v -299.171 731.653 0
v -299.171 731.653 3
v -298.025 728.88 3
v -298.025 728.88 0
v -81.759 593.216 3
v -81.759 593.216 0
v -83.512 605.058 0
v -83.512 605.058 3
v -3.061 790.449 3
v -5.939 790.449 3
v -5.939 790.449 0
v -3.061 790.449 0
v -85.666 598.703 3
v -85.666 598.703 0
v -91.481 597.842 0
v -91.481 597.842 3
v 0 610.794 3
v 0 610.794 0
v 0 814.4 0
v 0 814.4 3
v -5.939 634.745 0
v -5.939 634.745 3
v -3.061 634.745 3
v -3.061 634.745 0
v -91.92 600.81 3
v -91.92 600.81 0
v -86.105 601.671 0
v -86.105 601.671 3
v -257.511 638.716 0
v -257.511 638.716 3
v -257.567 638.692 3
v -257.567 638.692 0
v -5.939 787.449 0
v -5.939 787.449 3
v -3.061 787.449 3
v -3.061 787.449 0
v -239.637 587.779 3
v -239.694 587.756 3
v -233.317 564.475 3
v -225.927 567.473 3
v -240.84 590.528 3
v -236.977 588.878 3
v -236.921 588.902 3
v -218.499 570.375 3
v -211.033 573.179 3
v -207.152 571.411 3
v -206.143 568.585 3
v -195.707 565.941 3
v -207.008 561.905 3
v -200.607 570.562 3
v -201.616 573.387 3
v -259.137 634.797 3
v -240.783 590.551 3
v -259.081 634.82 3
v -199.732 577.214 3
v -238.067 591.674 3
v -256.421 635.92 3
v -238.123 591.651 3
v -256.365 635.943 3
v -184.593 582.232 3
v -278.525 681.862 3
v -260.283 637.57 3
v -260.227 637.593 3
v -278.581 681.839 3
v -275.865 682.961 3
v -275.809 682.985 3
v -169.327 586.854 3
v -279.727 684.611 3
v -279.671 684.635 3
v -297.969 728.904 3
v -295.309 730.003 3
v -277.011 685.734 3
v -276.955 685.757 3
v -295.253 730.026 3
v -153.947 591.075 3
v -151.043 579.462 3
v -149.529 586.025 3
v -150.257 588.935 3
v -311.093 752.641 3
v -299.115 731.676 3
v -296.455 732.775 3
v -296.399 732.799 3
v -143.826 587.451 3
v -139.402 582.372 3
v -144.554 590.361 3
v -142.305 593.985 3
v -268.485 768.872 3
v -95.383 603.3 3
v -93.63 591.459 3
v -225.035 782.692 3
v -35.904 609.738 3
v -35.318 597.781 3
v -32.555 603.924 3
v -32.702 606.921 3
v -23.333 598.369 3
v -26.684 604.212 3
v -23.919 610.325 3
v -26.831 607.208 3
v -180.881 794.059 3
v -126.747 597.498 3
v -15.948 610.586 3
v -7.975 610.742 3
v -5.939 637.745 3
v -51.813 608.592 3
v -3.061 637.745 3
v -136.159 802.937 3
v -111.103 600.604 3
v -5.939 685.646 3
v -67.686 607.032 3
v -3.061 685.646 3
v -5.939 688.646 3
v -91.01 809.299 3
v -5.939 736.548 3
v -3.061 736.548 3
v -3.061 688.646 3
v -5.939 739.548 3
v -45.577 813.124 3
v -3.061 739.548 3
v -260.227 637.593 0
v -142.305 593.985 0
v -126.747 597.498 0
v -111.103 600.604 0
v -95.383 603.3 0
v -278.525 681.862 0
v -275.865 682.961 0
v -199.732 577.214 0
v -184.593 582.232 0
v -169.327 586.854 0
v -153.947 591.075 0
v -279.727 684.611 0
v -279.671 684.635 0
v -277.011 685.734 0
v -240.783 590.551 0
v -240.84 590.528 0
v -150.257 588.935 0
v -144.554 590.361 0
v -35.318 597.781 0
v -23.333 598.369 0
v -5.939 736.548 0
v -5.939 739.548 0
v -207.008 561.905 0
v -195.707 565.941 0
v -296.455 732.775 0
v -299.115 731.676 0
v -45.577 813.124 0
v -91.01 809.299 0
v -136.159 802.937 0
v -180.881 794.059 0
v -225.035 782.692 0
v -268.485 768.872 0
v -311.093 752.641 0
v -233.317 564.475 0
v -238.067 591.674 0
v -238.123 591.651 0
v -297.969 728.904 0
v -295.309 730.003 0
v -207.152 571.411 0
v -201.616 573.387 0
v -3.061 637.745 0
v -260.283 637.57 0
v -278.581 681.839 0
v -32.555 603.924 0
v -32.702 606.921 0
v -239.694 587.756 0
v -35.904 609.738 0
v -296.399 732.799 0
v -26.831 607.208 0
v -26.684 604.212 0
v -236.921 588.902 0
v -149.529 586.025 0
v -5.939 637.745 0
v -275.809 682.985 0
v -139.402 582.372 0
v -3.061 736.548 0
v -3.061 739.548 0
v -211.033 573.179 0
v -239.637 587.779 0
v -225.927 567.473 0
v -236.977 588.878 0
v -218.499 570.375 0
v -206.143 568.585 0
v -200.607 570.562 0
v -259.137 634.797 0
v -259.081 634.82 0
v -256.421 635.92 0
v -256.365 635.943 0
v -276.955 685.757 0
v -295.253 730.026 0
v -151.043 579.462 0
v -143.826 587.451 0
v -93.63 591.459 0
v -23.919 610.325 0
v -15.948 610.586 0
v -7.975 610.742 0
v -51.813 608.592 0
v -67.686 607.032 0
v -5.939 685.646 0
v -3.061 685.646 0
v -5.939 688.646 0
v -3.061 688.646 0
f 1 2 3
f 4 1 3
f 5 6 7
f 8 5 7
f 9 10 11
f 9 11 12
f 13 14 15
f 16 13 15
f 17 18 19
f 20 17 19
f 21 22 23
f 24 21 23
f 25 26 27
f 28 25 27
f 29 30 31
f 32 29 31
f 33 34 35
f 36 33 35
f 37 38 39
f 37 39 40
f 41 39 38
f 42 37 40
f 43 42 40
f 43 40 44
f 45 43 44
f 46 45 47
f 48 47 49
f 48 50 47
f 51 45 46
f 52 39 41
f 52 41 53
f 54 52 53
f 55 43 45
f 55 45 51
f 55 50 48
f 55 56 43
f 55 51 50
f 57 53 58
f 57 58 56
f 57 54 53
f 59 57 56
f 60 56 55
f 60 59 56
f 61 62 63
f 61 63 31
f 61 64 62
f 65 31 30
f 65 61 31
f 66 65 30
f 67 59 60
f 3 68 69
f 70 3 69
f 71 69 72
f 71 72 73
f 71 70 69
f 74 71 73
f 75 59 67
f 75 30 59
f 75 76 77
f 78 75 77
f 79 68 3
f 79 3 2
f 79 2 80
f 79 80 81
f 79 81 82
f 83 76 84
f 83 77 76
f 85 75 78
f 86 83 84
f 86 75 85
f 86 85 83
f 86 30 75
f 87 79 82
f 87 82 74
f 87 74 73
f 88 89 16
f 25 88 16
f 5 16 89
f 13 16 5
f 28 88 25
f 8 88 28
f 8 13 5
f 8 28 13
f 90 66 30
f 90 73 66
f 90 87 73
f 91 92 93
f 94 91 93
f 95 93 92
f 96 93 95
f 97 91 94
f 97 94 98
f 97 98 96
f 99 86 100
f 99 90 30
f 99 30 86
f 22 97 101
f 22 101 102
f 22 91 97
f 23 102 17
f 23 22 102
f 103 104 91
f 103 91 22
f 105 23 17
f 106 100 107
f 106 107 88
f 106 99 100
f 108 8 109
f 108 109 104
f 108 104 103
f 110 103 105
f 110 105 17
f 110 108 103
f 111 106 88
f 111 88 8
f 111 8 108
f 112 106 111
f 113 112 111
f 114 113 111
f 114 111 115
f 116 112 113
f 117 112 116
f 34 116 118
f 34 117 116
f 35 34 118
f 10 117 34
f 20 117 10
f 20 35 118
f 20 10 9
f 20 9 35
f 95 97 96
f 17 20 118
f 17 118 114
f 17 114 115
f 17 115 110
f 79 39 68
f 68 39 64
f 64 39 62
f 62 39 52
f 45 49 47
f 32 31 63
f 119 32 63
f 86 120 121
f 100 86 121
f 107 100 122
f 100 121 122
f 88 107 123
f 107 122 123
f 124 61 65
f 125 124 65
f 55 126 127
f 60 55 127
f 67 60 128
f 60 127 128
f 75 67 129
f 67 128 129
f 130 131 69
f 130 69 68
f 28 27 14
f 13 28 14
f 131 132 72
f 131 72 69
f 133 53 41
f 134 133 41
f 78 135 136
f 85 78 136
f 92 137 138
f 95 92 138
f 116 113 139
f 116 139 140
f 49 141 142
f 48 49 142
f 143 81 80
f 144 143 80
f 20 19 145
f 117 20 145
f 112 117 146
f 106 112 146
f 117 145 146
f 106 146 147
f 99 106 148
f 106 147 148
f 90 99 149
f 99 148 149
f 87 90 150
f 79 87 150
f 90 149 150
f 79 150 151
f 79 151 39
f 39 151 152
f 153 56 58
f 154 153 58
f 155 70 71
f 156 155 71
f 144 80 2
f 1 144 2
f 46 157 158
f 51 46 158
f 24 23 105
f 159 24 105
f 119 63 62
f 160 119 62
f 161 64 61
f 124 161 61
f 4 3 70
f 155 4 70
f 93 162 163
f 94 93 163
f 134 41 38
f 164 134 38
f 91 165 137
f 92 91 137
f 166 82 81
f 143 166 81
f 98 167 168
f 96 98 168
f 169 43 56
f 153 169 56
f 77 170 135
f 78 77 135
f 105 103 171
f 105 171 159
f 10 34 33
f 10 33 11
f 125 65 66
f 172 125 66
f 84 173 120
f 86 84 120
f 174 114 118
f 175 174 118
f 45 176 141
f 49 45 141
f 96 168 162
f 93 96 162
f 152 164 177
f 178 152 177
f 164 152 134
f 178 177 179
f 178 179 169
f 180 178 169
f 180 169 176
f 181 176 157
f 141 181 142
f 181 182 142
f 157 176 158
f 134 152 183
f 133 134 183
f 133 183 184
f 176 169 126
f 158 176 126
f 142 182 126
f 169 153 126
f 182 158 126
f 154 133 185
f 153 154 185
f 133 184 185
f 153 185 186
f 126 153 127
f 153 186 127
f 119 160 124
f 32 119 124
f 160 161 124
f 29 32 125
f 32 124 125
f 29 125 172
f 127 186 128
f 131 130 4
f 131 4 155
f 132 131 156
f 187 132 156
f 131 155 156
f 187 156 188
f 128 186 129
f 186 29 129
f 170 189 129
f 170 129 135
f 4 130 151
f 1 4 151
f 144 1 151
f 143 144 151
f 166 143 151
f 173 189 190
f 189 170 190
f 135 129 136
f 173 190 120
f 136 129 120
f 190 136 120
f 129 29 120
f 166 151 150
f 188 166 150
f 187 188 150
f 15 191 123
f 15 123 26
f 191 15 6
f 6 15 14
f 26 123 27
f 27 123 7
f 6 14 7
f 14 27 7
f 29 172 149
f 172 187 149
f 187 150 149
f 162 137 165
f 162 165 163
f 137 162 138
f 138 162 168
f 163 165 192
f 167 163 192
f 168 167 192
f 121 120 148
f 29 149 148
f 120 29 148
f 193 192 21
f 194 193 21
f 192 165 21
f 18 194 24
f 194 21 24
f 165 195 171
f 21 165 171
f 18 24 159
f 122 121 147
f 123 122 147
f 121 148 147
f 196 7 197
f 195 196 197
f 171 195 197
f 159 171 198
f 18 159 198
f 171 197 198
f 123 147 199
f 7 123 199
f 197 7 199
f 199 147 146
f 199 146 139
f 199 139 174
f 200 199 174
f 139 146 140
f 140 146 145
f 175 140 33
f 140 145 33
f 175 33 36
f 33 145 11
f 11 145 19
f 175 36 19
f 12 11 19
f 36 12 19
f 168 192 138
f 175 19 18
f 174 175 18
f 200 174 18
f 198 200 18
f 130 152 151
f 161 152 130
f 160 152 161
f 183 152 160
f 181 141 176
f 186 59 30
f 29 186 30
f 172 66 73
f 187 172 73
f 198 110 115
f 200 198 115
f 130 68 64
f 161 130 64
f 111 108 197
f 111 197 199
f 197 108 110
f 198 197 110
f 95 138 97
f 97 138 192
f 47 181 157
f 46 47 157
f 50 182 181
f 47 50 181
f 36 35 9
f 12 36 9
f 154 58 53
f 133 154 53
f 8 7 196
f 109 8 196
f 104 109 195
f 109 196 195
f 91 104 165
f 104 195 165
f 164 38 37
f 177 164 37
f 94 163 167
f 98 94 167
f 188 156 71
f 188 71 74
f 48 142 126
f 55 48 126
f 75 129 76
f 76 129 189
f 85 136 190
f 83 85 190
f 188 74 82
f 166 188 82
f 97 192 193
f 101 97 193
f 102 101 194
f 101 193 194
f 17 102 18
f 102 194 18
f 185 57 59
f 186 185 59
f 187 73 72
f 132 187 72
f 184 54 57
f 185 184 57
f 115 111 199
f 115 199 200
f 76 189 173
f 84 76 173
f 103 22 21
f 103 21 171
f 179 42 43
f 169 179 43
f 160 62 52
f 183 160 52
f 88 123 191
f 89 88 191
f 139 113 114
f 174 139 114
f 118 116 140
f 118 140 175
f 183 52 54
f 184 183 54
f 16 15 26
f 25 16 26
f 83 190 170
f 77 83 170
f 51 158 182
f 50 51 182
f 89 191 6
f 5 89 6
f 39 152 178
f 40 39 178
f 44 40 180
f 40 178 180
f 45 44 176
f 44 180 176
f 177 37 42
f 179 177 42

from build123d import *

# Parameters (mm, degrees)
F1_DEPTH = 3
F2_W     = 2.87808
F2_H     = 3
F2_W_2   = 0.06096
F3_DEPTH = 3.001


with BuildPart() as f1:
    # F0 (on Top) → F1 (new body)
    with BuildSketch(Plane.XY):
        with BuildLine():
            Line((0, 610.7938), (0, 814.4002))
            ThreePointArc((0, 814.4002), (-158.581862972, 798.8112909169), (-311.092710136, 752.6413564642))
            Line((-311.092710136, 752.6413564642), (-233.3171069657, 564.4751488911))
            ThreePointArc((-233.3171069657, 564.4751488911), (-222.21778397, 568.9361322731), (-211.0332265418, 573.1788930289))
            Line((-211.0332265418, 573.1788930289), (-211.0431366506, 573.2066473717))
            Line((-211.0431366506, 573.2066473717), (-205.3925469131, 575.2242760793))
            Line((-205.3925469131, 575.2242760793), (-199.7419556033, 577.2419053483))
            Line((-199.7419556033, 577.2419053483), (-199.7320454946, 577.2141510055))
            ThreePointArc((-199.7320454946, 577.2141510055), (-176.9750657056, 584.592928658), (-153.9465878827, 591.0748803643))
            Line((-153.9465878827, 591.0748803643), (-153.9537352346, 591.1034710825))
            Line((-153.9537352346, 591.1034710825), (-148.1328657869, 592.5586217348))
            Line((-148.1328657869, 592.5586217348), (-142.3119938407, 594.0137730116))
            Line((-142.3119938407, 594.0137730116), (-142.3048464889, 593.9851822935))
            ThreePointArc((-142.3048464889, 593.9851822935), (-118.9351607425, 599.1022397368), (-95.3830161725, 603.3002124517))
            Line((-95.3830161725, 603.3002124517), (-95.3873321972, 603.3293652515))
            Line((-95.3873321972, 603.3293652515), (-89.4520324924, 604.2080767429))
            Line((-89.4520324924, 604.2080767429), (-83.5167190162, 605.0867902733))
            Line((-83.5167190162, 605.0867902733), (-83.5124029915, 605.0576374735))
            ThreePointArc((-83.5124029915, 605.0576374735), (-59.7542154208, 607.8638826727), (-35.9043587106, 609.7376018781))
            Line((-35.9043587105, 609.7376018781), (-35.905802001, 609.7670370733))
            Line((-35.905802001, 609.7670370733), (-29.9129956796, 610.0608812306))
            Line((-29.9129956796, 610.0608812306), (-23.9202013429, 610.3547248004))
            Line((-23.9202013429, 610.3547248004), (-23.9187580524, 610.3252896052))
            ThreePointArc((-23.9187580524, 610.3252896052), (-11.9616730515, 610.6766611688), (0, 610.7938))
        make_face()
        with BuildLine():
            Line((-23.3325136158, 598.3691241423), (-23.9187580524, 610.3252896052))
            ThreePointArc((-23.9187580524, 610.3252896052), (-26.9162015413, 610.2004459299), (-29.9129956796, 610.0608812306))
            ThreePointArc((-29.9129956796, 610.0608812306), (-32.9090741607, 609.9065985512), (-35.9043587106, 609.7376018781))
            Line((-35.9043587105, 609.7376018781), (-35.3181142739, 597.7814364152))
            Line((-35.3181142739, 597.7814364152), (-23.3325136158, 598.3691241423))
        make_face()
        Polygon((-32.7015930533, 606.9205442942), (-26.830566427, 607.2084172504), (-26.6836444952, 604.2120170859), (-32.5546711216, 603.9241441296), align=None, mode=Mode.SUBTRACT)
        with BuildLine():
            ThreePointArc((-29.9129956796, 610.0608812306), (-26.9162015413, 610.2004459299), (-23.9187580524, 610.3252896052))
            Line((-23.9187580524, 610.3252896052), (-23.9202013429, 610.3547248004))
            Line((-23.9202013429, 610.3547248004), (-29.9129956796, 610.0608812306))
        make_face()
        with BuildLine():
            ThreePointArc((-35.9043587106, 609.7376018781), (-32.9090741607, 609.9065985512), (-29.9129956796, 610.0608812306))
            Line((-29.9129956796, 610.0608812306), (-35.905802001, 609.7670370733))
            Line((-35.905802001, 609.7670370733), (-35.9043587105, 609.7376018781))
        make_face()
        with BuildLine():
            Line((-211.0431366506, 573.2066473717), (-211.0332265418, 573.1788930289))
            ThreePointArc((-211.0332265418, 573.1788930289), (-208.2153983194, 574.2085109271), (-205.3925469131, 575.2242760793))
            Line((-205.3925469131, 575.2242760793), (-211.0431366506, 573.2066473717))
        make_face()
        with BuildLine():
            ThreePointArc((-205.3925469131, 575.2242760793), (-208.2153983194, 574.2085109271), (-211.0332265418, 573.1788930289))
            Line((-211.0332265418, 573.1788930289), (-207.0078786739, 561.9054663245))
            Line((-207.0078786739, 561.9054663245), (-195.7066976267, 565.9407243011))
            Line((-195.7066976267, 565.9407243011), (-199.7320454946, 577.2141510055))
            ThreePointArc((-199.7320454946, 577.2141510055), (-202.5647396363, 576.2261642572), (-205.3925469131, 575.2242760793))
        make_face()
        Polygon((-207.1516168949, 571.4106657146), (-201.6158463707, 573.3872964819), (-200.6070318766, 570.5620012201), (-206.1428024007, 568.5853704528), align=None, mode=Mode.SUBTRACT)
        with BuildLine():
            Line((-199.7419556033, 577.2419053483), (-205.3925469131, 575.2242760793))
            ThreePointArc((-205.3925469131, 575.2242760793), (-202.5647396363, 576.2261642572), (-199.7320454946, 577.2141510055))
            Line((-199.7320454946, 577.2141510055), (-199.7419556033, 577.2419053483))
        make_face()
        with BuildLine():
            Line((-81.7592939944, 593.2161770923), (-83.5124029915, 605.0576374735))
            ThreePointArc((-83.5124029915, 605.0576374735), (-86.4832609464, 604.6401505809), (-89.4520324924, 604.2080767429))
            ThreePointArc((-89.4520324924, 604.2080767429), (-92.4186391273, 603.7614274366), (-95.3830161725, 603.3002124517))
            Line((-95.3830161725, 603.3002124517), (-93.6299071754, 591.4587520705))
            Line((-93.6299071754, 591.4587520705), (-81.7592939944, 593.2161770923))
        make_face()
        Polygon((-91.9200199316, 600.8099959308), (-86.105318771, 601.6708530035), (-85.6659625155, 598.7031997082), (-91.4806636761, 597.8423426355), align=None, mode=Mode.SUBTRACT)
        with BuildLine():
            ThreePointArc((-89.4520324924, 604.2080767429), (-86.4832609464, 604.6401505809), (-83.5124029915, 605.0576374735))
            Line((-83.5124029915, 605.0576374735), (-83.5167190162, 605.0867902733))
            Line((-83.5167190162, 605.0867902733), (-89.4520324924, 604.2080767429))
        make_face()
        with BuildLine():
            ThreePointArc((-95.3830161725, 603.3002124517), (-92.4186391273, 603.7614274366), (-89.4520324924, 604.2080767429))
            Line((-89.4520324924, 604.2080767429), (-95.3873321972, 603.3293652515))
            Line((-95.3873321972, 603.3293652515), (-95.3830161725, 603.3002124517))
        make_face()
        with BuildLine():
            Line((-153.9537352346, 591.1034710825), (-153.9465878827, 591.0748803643))
            ThreePointArc((-153.9465878827, 591.0748803643), (-151.0415487687, 591.8238899064), (-148.1328657869, 592.5586217348))
            Line((-148.1328657869, 592.5586217348), (-153.9537352346, 591.1034710825))
        make_face()
        with BuildLine():
            ThreePointArc((-148.1328657869, 592.5586217348), (-151.0415487687, 591.8238899064), (-153.9465878827, 591.0748803643))
            Line((-153.9465878827, 591.0748803643), (-151.0434333054, 579.4617296886))
            Line((-151.0434333054, 579.4617296886), (-139.4016919116, 582.3720316178))
            Line((-139.4016919116, 582.3720316178), (-142.3048464889, 593.9851822935))
            ThreePointArc((-142.3048464889, 593.9851822935), (-145.2206078584, 593.2790584301), (-148.1328657869, 592.5586217348))
        make_face()
        Polygon((-150.2565843576, 588.9353955501), (-144.5539937532, 590.3609778471), (-143.8264182709, 587.4505424986), (-149.5290088753, 586.0249602016), align=None, mode=Mode.SUBTRACT)
        with BuildLine():
            Line((-142.3119938407, 594.0137730116), (-148.1328657869, 592.5586217348))
            ThreePointArc((-148.1328657869, 592.5586217348), (-145.2206078584, 593.2790584301), (-142.3048464889, 593.9851822935))
            Line((-142.3048464889, 593.9851822935), (-142.3119938407, 594.0137730116))
        make_face()
    extrude(amount=F1_DEPTH)

    # F2 (on face) → F3 (cut, through all)
    with BuildSketch(Plane.XY.offset(3)):
        with Locations((-4.5, 636.2446)):
            Rectangle(F2_W, F2_H)
        with Locations((-4.5, 687.1462)):
            Rectangle(F2_W, F2_H)
        with Locations((-4.5, 738.0478)):
            Rectangle(F2_W, F2_H)
        with Locations((-4.5, 788.9494)):
            Rectangle(F2_W, F2_H)
        with Locations((4.5, 687.1462)):
            Rectangle(F2_W, F2_H)
        with Locations((3.03048, 687.1462)):
            Rectangle(F2_W_2, F2_H)
        with Locations((5.96952, 687.1462)):
            Rectangle(F2_W_2, F2_H)
        with Locations((3.03048, 788.9494)):
            Rectangle(F2_W_2, F2_H)
        with Locations((4.5, 788.9494)):
            Rectangle(F2_W, F2_H)
        with Locations((5.96952, 788.9494)):
            Rectangle(F2_W_2, F2_H)
        with Locations((3.03048, 636.2446)):
            Rectangle(F2_W_2, F2_H)
        with Locations((4.5, 636.2446)):
            Rectangle(F2_W, F2_H)
        with Locations((5.96952, 636.2446)):
            Rectangle(F2_W_2, F2_H)
        with Locations((3.03048, 738.0478)):
            Rectangle(F2_W_2, F2_H)
        with Locations((4.5, 738.0478)):
            Rectangle(F2_W, F2_H)
        with Locations((5.96952, 738.0478)):
            Rectangle(F2_W_2, F2_H)
        Polygon((-260.2834437092, 637.5696963512), (-259.1374737912, 634.7971969468), (-259.0811366033, 634.8204830556), (-260.2271065213, 637.5929824599), align=None)
        Polygon((-260.2271065213, 637.5929824599), (-259.0811366033, 634.8204830556), (-256.4213115748, 635.9198807561), (-257.5672814928, 638.6923801604), align=None)
        Polygon((-257.5672814928, 638.6923801604), (-256.4213115748, 635.9198807561), (-256.3649743869, 635.9431668648), (-257.5109443049, 638.7156662692), align=None)
        Polygon((-278.5250373959, 681.8620349488), (-279.6710073139, 684.6345343532), (-279.7273445018, 684.6112482444), (-278.5813745838, 681.8387488401), align=None)
        Polygon((-277.0111822853, 685.7339320537), (-279.6710073139, 684.6345343532), (-278.5250373959, 681.8620349488), (-275.8652123674, 682.9614326494), align=None)
        Polygon((-276.9548450974, 685.7572181624), (-277.0111822853, 685.7339320537), (-275.8652123674, 682.9614326494), (-275.8088751795, 682.9847187581), align=None)
        Polygon((-299.1712452944, 731.6528001377), (-298.0252753764, 728.8803007334), (-297.9689381885, 728.9035868421), (-299.1149081065, 731.6760862465), align=None)
        Polygon((-299.1149081065, 731.6760862465), (-297.9689381885, 728.9035868421), (-295.3091131599, 730.0029845426), (-296.4550830779, 732.775483947), align=None)
        Polygon((-296.4550830779, 732.775483947), (-295.3091131599, 730.0029845426), (-295.252775972, 730.0262706514), (-296.39874589, 732.7987700557), align=None)
        Polygon((-239.6935729986, 587.7556450535), (-239.6372358107, 587.7789311623), (-240.7832057287, 590.5514305666), (-240.8395429166, 590.5281444579), align=None)
        Polygon((-240.7832057287, 590.5514305666), (-239.6372358107, 587.7789311623), (-236.9774107822, 588.8783288628), (-238.1233807002, 591.6508282671), align=None)
        Polygon((-238.1233807002, 591.6508282671), (-236.9774107822, 588.8783288628), (-236.9210735943, 588.9016149715), (-238.0670435123, 591.6741143759), align=None)
    extrude(amount=-F3_DEPTH, mode=Mode.SUBTRACT)


solid = f1.part
